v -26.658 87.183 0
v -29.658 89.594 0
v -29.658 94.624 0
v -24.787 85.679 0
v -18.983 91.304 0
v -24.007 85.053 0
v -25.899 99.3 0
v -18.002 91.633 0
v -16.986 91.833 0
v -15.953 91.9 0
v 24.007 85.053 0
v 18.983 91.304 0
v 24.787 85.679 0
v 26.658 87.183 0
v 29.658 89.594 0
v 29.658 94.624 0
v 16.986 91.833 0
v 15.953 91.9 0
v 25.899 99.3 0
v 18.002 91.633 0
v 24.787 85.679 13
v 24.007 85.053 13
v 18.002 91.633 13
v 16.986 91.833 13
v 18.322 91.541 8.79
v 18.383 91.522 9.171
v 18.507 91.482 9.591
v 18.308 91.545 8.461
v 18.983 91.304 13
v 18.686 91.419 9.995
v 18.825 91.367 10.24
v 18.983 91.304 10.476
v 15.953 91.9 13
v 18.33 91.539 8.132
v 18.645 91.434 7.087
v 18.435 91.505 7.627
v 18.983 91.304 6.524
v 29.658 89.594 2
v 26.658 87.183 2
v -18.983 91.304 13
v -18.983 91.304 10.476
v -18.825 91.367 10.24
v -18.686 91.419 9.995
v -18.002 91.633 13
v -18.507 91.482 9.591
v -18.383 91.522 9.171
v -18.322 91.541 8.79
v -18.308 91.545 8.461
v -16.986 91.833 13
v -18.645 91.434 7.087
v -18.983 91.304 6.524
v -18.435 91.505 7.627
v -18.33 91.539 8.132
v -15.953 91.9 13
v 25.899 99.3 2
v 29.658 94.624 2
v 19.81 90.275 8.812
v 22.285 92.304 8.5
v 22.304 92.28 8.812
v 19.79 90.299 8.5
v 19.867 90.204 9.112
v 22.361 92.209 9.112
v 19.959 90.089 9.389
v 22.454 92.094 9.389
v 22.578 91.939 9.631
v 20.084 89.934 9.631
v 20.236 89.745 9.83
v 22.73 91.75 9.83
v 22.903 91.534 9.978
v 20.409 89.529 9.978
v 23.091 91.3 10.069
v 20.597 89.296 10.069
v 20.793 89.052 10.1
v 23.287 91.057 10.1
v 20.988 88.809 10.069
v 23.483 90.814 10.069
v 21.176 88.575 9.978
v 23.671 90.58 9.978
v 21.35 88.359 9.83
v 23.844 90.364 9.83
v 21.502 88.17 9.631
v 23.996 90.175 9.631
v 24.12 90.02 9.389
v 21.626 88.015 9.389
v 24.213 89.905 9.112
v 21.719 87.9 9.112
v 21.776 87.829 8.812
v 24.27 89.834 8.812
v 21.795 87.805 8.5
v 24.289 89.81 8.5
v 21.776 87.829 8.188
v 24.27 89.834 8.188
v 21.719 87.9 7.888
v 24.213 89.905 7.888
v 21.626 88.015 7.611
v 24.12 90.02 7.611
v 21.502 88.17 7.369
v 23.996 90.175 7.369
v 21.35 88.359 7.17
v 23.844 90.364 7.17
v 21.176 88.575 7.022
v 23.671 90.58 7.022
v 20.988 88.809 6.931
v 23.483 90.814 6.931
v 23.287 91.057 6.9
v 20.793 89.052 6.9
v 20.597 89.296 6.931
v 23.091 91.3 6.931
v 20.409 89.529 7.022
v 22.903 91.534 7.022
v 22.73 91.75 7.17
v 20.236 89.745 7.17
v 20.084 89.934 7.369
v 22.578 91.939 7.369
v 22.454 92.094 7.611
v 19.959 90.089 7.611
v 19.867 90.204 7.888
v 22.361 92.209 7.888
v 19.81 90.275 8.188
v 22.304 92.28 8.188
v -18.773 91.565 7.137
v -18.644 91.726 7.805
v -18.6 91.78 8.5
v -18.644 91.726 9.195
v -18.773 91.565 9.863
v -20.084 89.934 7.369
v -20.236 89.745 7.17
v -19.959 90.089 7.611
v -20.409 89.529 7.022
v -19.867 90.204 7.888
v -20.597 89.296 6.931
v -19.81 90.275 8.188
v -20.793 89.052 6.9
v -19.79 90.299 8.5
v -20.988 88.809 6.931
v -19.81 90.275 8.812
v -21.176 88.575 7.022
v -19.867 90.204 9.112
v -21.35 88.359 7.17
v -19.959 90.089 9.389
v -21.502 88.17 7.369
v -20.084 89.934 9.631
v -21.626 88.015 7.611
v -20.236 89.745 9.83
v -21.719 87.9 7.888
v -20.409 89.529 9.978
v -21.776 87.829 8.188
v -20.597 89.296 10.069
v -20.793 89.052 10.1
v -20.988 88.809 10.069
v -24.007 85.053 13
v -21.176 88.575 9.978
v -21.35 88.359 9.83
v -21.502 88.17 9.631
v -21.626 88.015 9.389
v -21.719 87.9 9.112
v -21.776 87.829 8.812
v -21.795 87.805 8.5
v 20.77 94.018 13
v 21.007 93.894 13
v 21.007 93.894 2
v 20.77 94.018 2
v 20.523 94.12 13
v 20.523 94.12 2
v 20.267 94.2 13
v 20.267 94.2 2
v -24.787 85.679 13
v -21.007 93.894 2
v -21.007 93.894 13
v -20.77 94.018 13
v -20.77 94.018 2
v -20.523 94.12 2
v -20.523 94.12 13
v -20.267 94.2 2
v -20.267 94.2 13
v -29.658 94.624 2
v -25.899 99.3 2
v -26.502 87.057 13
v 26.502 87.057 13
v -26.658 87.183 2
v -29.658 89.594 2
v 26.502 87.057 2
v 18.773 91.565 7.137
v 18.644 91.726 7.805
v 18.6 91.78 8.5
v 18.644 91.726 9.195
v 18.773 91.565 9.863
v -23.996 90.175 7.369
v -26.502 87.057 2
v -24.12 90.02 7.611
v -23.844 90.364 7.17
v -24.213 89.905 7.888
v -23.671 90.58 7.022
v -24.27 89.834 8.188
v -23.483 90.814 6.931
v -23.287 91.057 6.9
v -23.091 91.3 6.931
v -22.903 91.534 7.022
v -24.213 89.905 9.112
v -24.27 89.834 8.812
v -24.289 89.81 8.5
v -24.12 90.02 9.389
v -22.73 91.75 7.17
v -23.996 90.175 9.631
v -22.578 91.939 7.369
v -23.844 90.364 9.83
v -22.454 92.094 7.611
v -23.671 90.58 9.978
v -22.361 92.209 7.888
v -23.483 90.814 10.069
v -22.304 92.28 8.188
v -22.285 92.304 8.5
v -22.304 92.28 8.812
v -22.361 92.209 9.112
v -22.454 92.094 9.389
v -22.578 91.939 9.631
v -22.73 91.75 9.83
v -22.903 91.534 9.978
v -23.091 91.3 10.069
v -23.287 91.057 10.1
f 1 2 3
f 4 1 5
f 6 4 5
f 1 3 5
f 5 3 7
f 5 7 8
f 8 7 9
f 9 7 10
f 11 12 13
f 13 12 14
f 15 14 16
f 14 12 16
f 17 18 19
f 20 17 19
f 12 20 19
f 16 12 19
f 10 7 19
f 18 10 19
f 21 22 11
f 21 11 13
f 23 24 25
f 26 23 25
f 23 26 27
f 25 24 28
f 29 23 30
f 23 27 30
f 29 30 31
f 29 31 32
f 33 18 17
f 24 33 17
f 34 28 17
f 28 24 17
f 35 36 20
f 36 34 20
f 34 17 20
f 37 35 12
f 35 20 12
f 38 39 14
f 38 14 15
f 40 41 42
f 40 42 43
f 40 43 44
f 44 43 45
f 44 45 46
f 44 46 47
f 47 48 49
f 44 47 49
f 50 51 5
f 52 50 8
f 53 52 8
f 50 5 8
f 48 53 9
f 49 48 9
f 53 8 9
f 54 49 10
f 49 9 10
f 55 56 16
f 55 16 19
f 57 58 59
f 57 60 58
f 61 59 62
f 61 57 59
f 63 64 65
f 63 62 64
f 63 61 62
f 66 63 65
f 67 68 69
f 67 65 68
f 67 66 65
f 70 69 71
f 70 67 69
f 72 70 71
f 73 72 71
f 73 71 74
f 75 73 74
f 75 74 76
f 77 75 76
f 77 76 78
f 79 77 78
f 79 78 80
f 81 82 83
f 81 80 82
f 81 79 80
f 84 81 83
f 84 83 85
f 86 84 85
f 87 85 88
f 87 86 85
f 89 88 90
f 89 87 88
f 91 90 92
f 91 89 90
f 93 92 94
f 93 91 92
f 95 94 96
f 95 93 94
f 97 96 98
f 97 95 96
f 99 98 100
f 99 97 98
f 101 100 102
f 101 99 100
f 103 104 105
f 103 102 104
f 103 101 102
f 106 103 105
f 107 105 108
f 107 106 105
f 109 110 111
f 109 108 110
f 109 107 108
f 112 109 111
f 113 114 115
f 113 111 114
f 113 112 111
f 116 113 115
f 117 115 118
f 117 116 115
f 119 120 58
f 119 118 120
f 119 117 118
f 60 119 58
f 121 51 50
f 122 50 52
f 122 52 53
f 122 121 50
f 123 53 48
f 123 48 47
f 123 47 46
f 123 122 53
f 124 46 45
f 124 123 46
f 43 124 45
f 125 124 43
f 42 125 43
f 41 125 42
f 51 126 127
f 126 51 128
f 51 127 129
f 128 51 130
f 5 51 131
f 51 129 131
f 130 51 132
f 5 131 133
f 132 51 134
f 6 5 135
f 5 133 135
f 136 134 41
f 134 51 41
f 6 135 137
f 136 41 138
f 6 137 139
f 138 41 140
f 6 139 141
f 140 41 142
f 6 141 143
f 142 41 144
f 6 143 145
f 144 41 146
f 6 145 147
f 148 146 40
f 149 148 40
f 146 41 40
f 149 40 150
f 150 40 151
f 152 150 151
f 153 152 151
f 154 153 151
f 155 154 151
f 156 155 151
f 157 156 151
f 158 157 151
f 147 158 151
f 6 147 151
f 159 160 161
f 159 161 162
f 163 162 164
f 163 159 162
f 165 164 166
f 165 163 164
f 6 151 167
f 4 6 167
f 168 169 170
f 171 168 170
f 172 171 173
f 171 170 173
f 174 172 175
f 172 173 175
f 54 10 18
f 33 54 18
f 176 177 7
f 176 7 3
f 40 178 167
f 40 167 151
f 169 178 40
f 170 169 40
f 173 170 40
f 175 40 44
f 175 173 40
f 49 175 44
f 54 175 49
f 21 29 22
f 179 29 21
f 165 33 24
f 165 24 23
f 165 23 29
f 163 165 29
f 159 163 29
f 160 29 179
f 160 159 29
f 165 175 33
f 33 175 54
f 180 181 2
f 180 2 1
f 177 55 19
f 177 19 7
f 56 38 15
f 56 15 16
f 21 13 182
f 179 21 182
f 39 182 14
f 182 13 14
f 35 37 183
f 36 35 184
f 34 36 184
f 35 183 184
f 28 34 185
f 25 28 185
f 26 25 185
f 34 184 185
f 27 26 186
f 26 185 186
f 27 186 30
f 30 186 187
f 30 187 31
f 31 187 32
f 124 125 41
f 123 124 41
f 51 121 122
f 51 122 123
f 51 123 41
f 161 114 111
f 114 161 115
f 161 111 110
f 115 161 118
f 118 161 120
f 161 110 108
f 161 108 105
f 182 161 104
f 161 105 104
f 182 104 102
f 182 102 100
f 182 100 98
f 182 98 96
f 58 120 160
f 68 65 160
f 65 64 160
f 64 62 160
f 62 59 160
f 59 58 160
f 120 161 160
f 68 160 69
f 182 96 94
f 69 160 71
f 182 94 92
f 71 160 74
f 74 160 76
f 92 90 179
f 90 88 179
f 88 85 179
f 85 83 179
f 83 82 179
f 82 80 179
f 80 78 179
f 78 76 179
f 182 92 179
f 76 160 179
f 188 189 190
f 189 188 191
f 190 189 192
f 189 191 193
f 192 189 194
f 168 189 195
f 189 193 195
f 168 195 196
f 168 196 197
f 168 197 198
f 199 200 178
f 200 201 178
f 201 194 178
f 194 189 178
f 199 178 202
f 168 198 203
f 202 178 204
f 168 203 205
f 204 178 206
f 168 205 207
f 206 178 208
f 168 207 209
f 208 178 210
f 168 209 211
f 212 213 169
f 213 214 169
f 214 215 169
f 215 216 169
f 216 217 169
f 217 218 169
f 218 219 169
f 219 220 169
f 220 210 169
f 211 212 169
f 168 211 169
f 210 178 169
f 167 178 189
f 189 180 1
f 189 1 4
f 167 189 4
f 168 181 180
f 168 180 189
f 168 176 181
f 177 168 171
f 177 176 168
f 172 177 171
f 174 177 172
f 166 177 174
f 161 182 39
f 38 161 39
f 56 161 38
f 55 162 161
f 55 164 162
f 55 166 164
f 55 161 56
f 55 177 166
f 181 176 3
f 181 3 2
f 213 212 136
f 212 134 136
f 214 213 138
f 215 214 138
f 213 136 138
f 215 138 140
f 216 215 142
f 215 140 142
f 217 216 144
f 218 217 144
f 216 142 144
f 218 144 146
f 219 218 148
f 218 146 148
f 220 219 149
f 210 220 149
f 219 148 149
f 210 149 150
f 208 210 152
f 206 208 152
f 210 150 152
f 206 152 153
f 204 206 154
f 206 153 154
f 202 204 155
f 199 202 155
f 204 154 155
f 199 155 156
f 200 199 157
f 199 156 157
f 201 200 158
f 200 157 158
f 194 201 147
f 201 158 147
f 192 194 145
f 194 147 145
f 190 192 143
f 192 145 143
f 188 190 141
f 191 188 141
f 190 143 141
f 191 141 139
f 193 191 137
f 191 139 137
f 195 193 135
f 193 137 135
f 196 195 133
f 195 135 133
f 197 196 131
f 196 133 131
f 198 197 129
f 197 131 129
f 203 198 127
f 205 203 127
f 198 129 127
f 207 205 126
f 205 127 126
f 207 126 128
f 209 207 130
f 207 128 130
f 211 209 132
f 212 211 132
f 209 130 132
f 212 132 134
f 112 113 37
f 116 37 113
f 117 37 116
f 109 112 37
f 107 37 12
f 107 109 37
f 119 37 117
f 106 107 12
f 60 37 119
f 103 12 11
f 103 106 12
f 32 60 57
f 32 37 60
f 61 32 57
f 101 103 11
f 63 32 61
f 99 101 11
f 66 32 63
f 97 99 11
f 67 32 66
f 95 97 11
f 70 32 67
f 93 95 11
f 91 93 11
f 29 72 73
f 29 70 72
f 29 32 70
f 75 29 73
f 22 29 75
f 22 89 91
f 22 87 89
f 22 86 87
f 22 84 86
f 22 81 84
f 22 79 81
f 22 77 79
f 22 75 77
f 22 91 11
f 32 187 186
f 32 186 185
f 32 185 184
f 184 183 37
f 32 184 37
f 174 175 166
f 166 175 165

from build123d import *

# Parameters (mm, degrees)
EXTRUDE_5_DEPTH          = 30
EXTRUDE_6_DEPTH          = 2
CUT_EXTRUDE_7_DEPTH      = 10
CUT_EXTRUDE_7_DEPTH_BACK = 10
EXTRUDE_8_DEPTH          = 13
SKETCH_14_R              = 1.6
CUT_EXTRUDE_8_DEPTH      = 10
SKETCH_21_R              = 3.5
CUT_EXTRUDE_10_DEPTH     = 10
FILLET_3_R               = 3
CUT_EXTRUDE_9_DEPTH      = 11
EXTRUDE_7_DEPTH          = 2


with BuildPart() as part:
    # 草图1<3> → 凸台-拉伸5 (new body)
    with BuildSketch(Plane.XY):
        with BuildLine():
            Line((-20.937049459, 94.3), (-26.657578158, 87.182553786))
            Line((-26.657578158, 87.182553786), (-24.786904599, 85.67903111))
            Line((-24.786904599, 85.67903111), (-22.188666929, 88.911742253))
            ThreePointArc((-22.188666929, 88.911742253), (-19.410403975, 91.114358531), (-15.9530884, 91.9))
            Line((-15.9530884, 91.9), (15.9530884, 91.9))
            ThreePointArc((15.9530884, 91.9), (19.410403975, 91.114358531), (22.188666929, 88.911742253))
            Line((22.188666929, 88.911742253), (24.786904599, 85.67903111))
            Line((24.786904599, 85.67903111), (26.657578158, 87.182553786))
            Line((26.657578158, 87.182553786), (20.937049459, 94.3))
            Line((20.937049459, 94.3), (-20.937049459, 94.3))
        make_face()
    extrude(amount=EXTRUDE_5_DEPTH)

    # 草图12 → 凸台-拉伸6 (add)
    with BuildSketch(Plane(origin=(0, 0, 0), x_dir=(-1, 0, 0), z_dir=(0, 0, -1))):
        Polygon((20.937049459, 94.3), (26.657578158, 87.182553786), (26.657578158, 95.163810199), (23.333184583, 99.3), (-23.333184583, 99.3), (-26.657578158, 95.163810199), (-26.657578158, 87.182553786), (-20.937049459, 94.3), align=None)
    extrude(amount=-EXTRUDE_6_DEPTH)

    # 草图13 → 切除-拉伸7 (cut, two sides: drawn at the far end of the back side and taken through both)
    with BuildSketch(Plane.XZ.offset(-91.9).offset(-CUT_EXTRUDE_7_DEPTH_BACK)):
        Polygon((-15.9530884, 13), (15.9530884, 13), (26.657578158, 13), (26.657578158, 30), (-26.657578158, 30), (-26.657578158, 13), align=None)
    extrude(amount=CUT_EXTRUDE_7_DEPTH + CUT_EXTRUDE_7_DEPTH_BACK, mode=Mode.SUBTRACT)

    # 草图20 → 凸台-拉伸8 (add)
    with BuildSketch(Plane.XY.offset(13)):
        Polygon((-24.786904599, 85.67903111), (-19.762367643, 91.930528728), (-18.982920327, 91.304060946), (-24.007457283, 85.052563329), align=None)
    extrude_8 = extrude(amount=-EXTRUDE_8_DEPTH)

    # 草图14 → 切除-拉伸8 (cut, symmetric)
    with BuildSketch(Plane(origin=(-56.116495667, 45.102697556, 0), x_dir=(0, 0, -1), z_dir=(0.7794473160570586, -0.6264677816866944, 0))):
        with Locations(Location((-8.5, 56.385494975, 0), (0, 0, 90))):
            Circle(SKETCH_14_R)
    cut_extrude_8 = extrude(amount=CUT_EXTRUDE_8_DEPTH, both=True, mode=Mode.SUBTRACT)

    # 草图21 → 切除-拉伸10 (cut)
    with BuildSketch(Plane(origin=(-56.116495667, 45.102697556, 0), x_dir=(0, 0, -1), z_dir=(0.7794473160570586, -0.6264677816866944, 0))):
        with Locations((-8.5, 56.385494975)):
            Circle(SKETCH_21_R)
    cut_extrude_10 = extrude(amount=CUT_EXTRUDE_10_DEPTH, mode=Mode.SUBTRACT)

    # 镜向2: 凸台-拉伸8, 切除-拉伸8, 切除-拉伸10 across plane
    add(extrude_8.mirror(Plane(origin=(0, 0, 0), x_dir=(0, 0, 1), z_dir=(1, 0, 0))))
    add(cut_extrude_8.mirror(Plane(origin=(0, 0, 0), x_dir=(0, 0, 1), z_dir=(1, 0, 0))), mode=Mode.SUBTRACT)
    add(cut_extrude_10.mirror(Plane(origin=(0, 0, 0), x_dir=(0, 0, 1), z_dir=(1, 0, 0))), mode=Mode.SUBTRACT)

    # 圆角3
    fillet_3_edges = [part.edges().sort_by_distance(p)[0] for p in [
        (-20.937049459, 94.3, 7.5),
        (20.937049459, 94.3, 7.5),
    ]]
    fillet(fillet_3_edges, radius=FILLET_3_R)

    # 草图15 → 切除-拉伸9 (cut)
    with BuildSketch(Plane.XY.offset(13)):
        with BuildLine():
            ThreePointArc((21.837710333, 93.179403345), (21.455277133, 93.574735362), (21.007094419, 93.89360024))
            Line((21.007094419, 93.89360024), (26.501688695, 87.05726023))
            Line((26.501688695, 87.05726023), (26.657578158, 87.182553786))
            Line((26.657578158, 87.182553786), (21.837710333, 93.179403345))
        make_face()
        with BuildLine():
            Line((-26.657578158, 87.182553786), (-26.501688695, 87.05726023))
            Line((-26.501688695, 87.05726023), (-21.007094419, 93.89360024))
            ThreePointArc((-21.007094419, 93.89360024), (-21.455277133, 93.574735362), (-21.837710333, 93.179403345))
            Line((-21.837710333, 93.179403345), (-26.657578158, 87.182553786))
        make_face()
        with BuildLine():
            ThreePointArc((-19.499368384, 94.3), (-19.886666719, 94.274894956), (-20.267482959, 94.2))
            Line((-20.267482959, 94.2), (20.267482959, 94.2))
            ThreePointArc((20.267482959, 94.2), (19.886666719, 94.274894956), (19.499368384, 94.3))
            Line((19.499368384, 94.3), (-19.499368384, 94.3))
        make_face()
    extrude(amount=-CUT_EXTRUDE_9_DEPTH, mode=Mode.SUBTRACT)

    # 草图17 → 凸台-拉伸7 (add)
    with BuildSketch(Plane.XY.offset(2)):
        Polygon((-29.657578158, 89.593753756), (-26.657578158, 87.182553786), (-26.657578158, 95.163810199), (-23.333184583, 99.3), (-25.89910528, 99.3), (-29.657578158, 94.62373143), align=None)
        Polygon((23.333184583, 99.3), (26.657578158, 95.163810199), (26.657578158, 87.182553786), (29.657578158, 89.593753756), (29.657578158, 94.62373143), (25.89910528, 99.3), align=None)
    extrude(amount=-EXTRUDE_7_DEPTH)


solid = part.part
